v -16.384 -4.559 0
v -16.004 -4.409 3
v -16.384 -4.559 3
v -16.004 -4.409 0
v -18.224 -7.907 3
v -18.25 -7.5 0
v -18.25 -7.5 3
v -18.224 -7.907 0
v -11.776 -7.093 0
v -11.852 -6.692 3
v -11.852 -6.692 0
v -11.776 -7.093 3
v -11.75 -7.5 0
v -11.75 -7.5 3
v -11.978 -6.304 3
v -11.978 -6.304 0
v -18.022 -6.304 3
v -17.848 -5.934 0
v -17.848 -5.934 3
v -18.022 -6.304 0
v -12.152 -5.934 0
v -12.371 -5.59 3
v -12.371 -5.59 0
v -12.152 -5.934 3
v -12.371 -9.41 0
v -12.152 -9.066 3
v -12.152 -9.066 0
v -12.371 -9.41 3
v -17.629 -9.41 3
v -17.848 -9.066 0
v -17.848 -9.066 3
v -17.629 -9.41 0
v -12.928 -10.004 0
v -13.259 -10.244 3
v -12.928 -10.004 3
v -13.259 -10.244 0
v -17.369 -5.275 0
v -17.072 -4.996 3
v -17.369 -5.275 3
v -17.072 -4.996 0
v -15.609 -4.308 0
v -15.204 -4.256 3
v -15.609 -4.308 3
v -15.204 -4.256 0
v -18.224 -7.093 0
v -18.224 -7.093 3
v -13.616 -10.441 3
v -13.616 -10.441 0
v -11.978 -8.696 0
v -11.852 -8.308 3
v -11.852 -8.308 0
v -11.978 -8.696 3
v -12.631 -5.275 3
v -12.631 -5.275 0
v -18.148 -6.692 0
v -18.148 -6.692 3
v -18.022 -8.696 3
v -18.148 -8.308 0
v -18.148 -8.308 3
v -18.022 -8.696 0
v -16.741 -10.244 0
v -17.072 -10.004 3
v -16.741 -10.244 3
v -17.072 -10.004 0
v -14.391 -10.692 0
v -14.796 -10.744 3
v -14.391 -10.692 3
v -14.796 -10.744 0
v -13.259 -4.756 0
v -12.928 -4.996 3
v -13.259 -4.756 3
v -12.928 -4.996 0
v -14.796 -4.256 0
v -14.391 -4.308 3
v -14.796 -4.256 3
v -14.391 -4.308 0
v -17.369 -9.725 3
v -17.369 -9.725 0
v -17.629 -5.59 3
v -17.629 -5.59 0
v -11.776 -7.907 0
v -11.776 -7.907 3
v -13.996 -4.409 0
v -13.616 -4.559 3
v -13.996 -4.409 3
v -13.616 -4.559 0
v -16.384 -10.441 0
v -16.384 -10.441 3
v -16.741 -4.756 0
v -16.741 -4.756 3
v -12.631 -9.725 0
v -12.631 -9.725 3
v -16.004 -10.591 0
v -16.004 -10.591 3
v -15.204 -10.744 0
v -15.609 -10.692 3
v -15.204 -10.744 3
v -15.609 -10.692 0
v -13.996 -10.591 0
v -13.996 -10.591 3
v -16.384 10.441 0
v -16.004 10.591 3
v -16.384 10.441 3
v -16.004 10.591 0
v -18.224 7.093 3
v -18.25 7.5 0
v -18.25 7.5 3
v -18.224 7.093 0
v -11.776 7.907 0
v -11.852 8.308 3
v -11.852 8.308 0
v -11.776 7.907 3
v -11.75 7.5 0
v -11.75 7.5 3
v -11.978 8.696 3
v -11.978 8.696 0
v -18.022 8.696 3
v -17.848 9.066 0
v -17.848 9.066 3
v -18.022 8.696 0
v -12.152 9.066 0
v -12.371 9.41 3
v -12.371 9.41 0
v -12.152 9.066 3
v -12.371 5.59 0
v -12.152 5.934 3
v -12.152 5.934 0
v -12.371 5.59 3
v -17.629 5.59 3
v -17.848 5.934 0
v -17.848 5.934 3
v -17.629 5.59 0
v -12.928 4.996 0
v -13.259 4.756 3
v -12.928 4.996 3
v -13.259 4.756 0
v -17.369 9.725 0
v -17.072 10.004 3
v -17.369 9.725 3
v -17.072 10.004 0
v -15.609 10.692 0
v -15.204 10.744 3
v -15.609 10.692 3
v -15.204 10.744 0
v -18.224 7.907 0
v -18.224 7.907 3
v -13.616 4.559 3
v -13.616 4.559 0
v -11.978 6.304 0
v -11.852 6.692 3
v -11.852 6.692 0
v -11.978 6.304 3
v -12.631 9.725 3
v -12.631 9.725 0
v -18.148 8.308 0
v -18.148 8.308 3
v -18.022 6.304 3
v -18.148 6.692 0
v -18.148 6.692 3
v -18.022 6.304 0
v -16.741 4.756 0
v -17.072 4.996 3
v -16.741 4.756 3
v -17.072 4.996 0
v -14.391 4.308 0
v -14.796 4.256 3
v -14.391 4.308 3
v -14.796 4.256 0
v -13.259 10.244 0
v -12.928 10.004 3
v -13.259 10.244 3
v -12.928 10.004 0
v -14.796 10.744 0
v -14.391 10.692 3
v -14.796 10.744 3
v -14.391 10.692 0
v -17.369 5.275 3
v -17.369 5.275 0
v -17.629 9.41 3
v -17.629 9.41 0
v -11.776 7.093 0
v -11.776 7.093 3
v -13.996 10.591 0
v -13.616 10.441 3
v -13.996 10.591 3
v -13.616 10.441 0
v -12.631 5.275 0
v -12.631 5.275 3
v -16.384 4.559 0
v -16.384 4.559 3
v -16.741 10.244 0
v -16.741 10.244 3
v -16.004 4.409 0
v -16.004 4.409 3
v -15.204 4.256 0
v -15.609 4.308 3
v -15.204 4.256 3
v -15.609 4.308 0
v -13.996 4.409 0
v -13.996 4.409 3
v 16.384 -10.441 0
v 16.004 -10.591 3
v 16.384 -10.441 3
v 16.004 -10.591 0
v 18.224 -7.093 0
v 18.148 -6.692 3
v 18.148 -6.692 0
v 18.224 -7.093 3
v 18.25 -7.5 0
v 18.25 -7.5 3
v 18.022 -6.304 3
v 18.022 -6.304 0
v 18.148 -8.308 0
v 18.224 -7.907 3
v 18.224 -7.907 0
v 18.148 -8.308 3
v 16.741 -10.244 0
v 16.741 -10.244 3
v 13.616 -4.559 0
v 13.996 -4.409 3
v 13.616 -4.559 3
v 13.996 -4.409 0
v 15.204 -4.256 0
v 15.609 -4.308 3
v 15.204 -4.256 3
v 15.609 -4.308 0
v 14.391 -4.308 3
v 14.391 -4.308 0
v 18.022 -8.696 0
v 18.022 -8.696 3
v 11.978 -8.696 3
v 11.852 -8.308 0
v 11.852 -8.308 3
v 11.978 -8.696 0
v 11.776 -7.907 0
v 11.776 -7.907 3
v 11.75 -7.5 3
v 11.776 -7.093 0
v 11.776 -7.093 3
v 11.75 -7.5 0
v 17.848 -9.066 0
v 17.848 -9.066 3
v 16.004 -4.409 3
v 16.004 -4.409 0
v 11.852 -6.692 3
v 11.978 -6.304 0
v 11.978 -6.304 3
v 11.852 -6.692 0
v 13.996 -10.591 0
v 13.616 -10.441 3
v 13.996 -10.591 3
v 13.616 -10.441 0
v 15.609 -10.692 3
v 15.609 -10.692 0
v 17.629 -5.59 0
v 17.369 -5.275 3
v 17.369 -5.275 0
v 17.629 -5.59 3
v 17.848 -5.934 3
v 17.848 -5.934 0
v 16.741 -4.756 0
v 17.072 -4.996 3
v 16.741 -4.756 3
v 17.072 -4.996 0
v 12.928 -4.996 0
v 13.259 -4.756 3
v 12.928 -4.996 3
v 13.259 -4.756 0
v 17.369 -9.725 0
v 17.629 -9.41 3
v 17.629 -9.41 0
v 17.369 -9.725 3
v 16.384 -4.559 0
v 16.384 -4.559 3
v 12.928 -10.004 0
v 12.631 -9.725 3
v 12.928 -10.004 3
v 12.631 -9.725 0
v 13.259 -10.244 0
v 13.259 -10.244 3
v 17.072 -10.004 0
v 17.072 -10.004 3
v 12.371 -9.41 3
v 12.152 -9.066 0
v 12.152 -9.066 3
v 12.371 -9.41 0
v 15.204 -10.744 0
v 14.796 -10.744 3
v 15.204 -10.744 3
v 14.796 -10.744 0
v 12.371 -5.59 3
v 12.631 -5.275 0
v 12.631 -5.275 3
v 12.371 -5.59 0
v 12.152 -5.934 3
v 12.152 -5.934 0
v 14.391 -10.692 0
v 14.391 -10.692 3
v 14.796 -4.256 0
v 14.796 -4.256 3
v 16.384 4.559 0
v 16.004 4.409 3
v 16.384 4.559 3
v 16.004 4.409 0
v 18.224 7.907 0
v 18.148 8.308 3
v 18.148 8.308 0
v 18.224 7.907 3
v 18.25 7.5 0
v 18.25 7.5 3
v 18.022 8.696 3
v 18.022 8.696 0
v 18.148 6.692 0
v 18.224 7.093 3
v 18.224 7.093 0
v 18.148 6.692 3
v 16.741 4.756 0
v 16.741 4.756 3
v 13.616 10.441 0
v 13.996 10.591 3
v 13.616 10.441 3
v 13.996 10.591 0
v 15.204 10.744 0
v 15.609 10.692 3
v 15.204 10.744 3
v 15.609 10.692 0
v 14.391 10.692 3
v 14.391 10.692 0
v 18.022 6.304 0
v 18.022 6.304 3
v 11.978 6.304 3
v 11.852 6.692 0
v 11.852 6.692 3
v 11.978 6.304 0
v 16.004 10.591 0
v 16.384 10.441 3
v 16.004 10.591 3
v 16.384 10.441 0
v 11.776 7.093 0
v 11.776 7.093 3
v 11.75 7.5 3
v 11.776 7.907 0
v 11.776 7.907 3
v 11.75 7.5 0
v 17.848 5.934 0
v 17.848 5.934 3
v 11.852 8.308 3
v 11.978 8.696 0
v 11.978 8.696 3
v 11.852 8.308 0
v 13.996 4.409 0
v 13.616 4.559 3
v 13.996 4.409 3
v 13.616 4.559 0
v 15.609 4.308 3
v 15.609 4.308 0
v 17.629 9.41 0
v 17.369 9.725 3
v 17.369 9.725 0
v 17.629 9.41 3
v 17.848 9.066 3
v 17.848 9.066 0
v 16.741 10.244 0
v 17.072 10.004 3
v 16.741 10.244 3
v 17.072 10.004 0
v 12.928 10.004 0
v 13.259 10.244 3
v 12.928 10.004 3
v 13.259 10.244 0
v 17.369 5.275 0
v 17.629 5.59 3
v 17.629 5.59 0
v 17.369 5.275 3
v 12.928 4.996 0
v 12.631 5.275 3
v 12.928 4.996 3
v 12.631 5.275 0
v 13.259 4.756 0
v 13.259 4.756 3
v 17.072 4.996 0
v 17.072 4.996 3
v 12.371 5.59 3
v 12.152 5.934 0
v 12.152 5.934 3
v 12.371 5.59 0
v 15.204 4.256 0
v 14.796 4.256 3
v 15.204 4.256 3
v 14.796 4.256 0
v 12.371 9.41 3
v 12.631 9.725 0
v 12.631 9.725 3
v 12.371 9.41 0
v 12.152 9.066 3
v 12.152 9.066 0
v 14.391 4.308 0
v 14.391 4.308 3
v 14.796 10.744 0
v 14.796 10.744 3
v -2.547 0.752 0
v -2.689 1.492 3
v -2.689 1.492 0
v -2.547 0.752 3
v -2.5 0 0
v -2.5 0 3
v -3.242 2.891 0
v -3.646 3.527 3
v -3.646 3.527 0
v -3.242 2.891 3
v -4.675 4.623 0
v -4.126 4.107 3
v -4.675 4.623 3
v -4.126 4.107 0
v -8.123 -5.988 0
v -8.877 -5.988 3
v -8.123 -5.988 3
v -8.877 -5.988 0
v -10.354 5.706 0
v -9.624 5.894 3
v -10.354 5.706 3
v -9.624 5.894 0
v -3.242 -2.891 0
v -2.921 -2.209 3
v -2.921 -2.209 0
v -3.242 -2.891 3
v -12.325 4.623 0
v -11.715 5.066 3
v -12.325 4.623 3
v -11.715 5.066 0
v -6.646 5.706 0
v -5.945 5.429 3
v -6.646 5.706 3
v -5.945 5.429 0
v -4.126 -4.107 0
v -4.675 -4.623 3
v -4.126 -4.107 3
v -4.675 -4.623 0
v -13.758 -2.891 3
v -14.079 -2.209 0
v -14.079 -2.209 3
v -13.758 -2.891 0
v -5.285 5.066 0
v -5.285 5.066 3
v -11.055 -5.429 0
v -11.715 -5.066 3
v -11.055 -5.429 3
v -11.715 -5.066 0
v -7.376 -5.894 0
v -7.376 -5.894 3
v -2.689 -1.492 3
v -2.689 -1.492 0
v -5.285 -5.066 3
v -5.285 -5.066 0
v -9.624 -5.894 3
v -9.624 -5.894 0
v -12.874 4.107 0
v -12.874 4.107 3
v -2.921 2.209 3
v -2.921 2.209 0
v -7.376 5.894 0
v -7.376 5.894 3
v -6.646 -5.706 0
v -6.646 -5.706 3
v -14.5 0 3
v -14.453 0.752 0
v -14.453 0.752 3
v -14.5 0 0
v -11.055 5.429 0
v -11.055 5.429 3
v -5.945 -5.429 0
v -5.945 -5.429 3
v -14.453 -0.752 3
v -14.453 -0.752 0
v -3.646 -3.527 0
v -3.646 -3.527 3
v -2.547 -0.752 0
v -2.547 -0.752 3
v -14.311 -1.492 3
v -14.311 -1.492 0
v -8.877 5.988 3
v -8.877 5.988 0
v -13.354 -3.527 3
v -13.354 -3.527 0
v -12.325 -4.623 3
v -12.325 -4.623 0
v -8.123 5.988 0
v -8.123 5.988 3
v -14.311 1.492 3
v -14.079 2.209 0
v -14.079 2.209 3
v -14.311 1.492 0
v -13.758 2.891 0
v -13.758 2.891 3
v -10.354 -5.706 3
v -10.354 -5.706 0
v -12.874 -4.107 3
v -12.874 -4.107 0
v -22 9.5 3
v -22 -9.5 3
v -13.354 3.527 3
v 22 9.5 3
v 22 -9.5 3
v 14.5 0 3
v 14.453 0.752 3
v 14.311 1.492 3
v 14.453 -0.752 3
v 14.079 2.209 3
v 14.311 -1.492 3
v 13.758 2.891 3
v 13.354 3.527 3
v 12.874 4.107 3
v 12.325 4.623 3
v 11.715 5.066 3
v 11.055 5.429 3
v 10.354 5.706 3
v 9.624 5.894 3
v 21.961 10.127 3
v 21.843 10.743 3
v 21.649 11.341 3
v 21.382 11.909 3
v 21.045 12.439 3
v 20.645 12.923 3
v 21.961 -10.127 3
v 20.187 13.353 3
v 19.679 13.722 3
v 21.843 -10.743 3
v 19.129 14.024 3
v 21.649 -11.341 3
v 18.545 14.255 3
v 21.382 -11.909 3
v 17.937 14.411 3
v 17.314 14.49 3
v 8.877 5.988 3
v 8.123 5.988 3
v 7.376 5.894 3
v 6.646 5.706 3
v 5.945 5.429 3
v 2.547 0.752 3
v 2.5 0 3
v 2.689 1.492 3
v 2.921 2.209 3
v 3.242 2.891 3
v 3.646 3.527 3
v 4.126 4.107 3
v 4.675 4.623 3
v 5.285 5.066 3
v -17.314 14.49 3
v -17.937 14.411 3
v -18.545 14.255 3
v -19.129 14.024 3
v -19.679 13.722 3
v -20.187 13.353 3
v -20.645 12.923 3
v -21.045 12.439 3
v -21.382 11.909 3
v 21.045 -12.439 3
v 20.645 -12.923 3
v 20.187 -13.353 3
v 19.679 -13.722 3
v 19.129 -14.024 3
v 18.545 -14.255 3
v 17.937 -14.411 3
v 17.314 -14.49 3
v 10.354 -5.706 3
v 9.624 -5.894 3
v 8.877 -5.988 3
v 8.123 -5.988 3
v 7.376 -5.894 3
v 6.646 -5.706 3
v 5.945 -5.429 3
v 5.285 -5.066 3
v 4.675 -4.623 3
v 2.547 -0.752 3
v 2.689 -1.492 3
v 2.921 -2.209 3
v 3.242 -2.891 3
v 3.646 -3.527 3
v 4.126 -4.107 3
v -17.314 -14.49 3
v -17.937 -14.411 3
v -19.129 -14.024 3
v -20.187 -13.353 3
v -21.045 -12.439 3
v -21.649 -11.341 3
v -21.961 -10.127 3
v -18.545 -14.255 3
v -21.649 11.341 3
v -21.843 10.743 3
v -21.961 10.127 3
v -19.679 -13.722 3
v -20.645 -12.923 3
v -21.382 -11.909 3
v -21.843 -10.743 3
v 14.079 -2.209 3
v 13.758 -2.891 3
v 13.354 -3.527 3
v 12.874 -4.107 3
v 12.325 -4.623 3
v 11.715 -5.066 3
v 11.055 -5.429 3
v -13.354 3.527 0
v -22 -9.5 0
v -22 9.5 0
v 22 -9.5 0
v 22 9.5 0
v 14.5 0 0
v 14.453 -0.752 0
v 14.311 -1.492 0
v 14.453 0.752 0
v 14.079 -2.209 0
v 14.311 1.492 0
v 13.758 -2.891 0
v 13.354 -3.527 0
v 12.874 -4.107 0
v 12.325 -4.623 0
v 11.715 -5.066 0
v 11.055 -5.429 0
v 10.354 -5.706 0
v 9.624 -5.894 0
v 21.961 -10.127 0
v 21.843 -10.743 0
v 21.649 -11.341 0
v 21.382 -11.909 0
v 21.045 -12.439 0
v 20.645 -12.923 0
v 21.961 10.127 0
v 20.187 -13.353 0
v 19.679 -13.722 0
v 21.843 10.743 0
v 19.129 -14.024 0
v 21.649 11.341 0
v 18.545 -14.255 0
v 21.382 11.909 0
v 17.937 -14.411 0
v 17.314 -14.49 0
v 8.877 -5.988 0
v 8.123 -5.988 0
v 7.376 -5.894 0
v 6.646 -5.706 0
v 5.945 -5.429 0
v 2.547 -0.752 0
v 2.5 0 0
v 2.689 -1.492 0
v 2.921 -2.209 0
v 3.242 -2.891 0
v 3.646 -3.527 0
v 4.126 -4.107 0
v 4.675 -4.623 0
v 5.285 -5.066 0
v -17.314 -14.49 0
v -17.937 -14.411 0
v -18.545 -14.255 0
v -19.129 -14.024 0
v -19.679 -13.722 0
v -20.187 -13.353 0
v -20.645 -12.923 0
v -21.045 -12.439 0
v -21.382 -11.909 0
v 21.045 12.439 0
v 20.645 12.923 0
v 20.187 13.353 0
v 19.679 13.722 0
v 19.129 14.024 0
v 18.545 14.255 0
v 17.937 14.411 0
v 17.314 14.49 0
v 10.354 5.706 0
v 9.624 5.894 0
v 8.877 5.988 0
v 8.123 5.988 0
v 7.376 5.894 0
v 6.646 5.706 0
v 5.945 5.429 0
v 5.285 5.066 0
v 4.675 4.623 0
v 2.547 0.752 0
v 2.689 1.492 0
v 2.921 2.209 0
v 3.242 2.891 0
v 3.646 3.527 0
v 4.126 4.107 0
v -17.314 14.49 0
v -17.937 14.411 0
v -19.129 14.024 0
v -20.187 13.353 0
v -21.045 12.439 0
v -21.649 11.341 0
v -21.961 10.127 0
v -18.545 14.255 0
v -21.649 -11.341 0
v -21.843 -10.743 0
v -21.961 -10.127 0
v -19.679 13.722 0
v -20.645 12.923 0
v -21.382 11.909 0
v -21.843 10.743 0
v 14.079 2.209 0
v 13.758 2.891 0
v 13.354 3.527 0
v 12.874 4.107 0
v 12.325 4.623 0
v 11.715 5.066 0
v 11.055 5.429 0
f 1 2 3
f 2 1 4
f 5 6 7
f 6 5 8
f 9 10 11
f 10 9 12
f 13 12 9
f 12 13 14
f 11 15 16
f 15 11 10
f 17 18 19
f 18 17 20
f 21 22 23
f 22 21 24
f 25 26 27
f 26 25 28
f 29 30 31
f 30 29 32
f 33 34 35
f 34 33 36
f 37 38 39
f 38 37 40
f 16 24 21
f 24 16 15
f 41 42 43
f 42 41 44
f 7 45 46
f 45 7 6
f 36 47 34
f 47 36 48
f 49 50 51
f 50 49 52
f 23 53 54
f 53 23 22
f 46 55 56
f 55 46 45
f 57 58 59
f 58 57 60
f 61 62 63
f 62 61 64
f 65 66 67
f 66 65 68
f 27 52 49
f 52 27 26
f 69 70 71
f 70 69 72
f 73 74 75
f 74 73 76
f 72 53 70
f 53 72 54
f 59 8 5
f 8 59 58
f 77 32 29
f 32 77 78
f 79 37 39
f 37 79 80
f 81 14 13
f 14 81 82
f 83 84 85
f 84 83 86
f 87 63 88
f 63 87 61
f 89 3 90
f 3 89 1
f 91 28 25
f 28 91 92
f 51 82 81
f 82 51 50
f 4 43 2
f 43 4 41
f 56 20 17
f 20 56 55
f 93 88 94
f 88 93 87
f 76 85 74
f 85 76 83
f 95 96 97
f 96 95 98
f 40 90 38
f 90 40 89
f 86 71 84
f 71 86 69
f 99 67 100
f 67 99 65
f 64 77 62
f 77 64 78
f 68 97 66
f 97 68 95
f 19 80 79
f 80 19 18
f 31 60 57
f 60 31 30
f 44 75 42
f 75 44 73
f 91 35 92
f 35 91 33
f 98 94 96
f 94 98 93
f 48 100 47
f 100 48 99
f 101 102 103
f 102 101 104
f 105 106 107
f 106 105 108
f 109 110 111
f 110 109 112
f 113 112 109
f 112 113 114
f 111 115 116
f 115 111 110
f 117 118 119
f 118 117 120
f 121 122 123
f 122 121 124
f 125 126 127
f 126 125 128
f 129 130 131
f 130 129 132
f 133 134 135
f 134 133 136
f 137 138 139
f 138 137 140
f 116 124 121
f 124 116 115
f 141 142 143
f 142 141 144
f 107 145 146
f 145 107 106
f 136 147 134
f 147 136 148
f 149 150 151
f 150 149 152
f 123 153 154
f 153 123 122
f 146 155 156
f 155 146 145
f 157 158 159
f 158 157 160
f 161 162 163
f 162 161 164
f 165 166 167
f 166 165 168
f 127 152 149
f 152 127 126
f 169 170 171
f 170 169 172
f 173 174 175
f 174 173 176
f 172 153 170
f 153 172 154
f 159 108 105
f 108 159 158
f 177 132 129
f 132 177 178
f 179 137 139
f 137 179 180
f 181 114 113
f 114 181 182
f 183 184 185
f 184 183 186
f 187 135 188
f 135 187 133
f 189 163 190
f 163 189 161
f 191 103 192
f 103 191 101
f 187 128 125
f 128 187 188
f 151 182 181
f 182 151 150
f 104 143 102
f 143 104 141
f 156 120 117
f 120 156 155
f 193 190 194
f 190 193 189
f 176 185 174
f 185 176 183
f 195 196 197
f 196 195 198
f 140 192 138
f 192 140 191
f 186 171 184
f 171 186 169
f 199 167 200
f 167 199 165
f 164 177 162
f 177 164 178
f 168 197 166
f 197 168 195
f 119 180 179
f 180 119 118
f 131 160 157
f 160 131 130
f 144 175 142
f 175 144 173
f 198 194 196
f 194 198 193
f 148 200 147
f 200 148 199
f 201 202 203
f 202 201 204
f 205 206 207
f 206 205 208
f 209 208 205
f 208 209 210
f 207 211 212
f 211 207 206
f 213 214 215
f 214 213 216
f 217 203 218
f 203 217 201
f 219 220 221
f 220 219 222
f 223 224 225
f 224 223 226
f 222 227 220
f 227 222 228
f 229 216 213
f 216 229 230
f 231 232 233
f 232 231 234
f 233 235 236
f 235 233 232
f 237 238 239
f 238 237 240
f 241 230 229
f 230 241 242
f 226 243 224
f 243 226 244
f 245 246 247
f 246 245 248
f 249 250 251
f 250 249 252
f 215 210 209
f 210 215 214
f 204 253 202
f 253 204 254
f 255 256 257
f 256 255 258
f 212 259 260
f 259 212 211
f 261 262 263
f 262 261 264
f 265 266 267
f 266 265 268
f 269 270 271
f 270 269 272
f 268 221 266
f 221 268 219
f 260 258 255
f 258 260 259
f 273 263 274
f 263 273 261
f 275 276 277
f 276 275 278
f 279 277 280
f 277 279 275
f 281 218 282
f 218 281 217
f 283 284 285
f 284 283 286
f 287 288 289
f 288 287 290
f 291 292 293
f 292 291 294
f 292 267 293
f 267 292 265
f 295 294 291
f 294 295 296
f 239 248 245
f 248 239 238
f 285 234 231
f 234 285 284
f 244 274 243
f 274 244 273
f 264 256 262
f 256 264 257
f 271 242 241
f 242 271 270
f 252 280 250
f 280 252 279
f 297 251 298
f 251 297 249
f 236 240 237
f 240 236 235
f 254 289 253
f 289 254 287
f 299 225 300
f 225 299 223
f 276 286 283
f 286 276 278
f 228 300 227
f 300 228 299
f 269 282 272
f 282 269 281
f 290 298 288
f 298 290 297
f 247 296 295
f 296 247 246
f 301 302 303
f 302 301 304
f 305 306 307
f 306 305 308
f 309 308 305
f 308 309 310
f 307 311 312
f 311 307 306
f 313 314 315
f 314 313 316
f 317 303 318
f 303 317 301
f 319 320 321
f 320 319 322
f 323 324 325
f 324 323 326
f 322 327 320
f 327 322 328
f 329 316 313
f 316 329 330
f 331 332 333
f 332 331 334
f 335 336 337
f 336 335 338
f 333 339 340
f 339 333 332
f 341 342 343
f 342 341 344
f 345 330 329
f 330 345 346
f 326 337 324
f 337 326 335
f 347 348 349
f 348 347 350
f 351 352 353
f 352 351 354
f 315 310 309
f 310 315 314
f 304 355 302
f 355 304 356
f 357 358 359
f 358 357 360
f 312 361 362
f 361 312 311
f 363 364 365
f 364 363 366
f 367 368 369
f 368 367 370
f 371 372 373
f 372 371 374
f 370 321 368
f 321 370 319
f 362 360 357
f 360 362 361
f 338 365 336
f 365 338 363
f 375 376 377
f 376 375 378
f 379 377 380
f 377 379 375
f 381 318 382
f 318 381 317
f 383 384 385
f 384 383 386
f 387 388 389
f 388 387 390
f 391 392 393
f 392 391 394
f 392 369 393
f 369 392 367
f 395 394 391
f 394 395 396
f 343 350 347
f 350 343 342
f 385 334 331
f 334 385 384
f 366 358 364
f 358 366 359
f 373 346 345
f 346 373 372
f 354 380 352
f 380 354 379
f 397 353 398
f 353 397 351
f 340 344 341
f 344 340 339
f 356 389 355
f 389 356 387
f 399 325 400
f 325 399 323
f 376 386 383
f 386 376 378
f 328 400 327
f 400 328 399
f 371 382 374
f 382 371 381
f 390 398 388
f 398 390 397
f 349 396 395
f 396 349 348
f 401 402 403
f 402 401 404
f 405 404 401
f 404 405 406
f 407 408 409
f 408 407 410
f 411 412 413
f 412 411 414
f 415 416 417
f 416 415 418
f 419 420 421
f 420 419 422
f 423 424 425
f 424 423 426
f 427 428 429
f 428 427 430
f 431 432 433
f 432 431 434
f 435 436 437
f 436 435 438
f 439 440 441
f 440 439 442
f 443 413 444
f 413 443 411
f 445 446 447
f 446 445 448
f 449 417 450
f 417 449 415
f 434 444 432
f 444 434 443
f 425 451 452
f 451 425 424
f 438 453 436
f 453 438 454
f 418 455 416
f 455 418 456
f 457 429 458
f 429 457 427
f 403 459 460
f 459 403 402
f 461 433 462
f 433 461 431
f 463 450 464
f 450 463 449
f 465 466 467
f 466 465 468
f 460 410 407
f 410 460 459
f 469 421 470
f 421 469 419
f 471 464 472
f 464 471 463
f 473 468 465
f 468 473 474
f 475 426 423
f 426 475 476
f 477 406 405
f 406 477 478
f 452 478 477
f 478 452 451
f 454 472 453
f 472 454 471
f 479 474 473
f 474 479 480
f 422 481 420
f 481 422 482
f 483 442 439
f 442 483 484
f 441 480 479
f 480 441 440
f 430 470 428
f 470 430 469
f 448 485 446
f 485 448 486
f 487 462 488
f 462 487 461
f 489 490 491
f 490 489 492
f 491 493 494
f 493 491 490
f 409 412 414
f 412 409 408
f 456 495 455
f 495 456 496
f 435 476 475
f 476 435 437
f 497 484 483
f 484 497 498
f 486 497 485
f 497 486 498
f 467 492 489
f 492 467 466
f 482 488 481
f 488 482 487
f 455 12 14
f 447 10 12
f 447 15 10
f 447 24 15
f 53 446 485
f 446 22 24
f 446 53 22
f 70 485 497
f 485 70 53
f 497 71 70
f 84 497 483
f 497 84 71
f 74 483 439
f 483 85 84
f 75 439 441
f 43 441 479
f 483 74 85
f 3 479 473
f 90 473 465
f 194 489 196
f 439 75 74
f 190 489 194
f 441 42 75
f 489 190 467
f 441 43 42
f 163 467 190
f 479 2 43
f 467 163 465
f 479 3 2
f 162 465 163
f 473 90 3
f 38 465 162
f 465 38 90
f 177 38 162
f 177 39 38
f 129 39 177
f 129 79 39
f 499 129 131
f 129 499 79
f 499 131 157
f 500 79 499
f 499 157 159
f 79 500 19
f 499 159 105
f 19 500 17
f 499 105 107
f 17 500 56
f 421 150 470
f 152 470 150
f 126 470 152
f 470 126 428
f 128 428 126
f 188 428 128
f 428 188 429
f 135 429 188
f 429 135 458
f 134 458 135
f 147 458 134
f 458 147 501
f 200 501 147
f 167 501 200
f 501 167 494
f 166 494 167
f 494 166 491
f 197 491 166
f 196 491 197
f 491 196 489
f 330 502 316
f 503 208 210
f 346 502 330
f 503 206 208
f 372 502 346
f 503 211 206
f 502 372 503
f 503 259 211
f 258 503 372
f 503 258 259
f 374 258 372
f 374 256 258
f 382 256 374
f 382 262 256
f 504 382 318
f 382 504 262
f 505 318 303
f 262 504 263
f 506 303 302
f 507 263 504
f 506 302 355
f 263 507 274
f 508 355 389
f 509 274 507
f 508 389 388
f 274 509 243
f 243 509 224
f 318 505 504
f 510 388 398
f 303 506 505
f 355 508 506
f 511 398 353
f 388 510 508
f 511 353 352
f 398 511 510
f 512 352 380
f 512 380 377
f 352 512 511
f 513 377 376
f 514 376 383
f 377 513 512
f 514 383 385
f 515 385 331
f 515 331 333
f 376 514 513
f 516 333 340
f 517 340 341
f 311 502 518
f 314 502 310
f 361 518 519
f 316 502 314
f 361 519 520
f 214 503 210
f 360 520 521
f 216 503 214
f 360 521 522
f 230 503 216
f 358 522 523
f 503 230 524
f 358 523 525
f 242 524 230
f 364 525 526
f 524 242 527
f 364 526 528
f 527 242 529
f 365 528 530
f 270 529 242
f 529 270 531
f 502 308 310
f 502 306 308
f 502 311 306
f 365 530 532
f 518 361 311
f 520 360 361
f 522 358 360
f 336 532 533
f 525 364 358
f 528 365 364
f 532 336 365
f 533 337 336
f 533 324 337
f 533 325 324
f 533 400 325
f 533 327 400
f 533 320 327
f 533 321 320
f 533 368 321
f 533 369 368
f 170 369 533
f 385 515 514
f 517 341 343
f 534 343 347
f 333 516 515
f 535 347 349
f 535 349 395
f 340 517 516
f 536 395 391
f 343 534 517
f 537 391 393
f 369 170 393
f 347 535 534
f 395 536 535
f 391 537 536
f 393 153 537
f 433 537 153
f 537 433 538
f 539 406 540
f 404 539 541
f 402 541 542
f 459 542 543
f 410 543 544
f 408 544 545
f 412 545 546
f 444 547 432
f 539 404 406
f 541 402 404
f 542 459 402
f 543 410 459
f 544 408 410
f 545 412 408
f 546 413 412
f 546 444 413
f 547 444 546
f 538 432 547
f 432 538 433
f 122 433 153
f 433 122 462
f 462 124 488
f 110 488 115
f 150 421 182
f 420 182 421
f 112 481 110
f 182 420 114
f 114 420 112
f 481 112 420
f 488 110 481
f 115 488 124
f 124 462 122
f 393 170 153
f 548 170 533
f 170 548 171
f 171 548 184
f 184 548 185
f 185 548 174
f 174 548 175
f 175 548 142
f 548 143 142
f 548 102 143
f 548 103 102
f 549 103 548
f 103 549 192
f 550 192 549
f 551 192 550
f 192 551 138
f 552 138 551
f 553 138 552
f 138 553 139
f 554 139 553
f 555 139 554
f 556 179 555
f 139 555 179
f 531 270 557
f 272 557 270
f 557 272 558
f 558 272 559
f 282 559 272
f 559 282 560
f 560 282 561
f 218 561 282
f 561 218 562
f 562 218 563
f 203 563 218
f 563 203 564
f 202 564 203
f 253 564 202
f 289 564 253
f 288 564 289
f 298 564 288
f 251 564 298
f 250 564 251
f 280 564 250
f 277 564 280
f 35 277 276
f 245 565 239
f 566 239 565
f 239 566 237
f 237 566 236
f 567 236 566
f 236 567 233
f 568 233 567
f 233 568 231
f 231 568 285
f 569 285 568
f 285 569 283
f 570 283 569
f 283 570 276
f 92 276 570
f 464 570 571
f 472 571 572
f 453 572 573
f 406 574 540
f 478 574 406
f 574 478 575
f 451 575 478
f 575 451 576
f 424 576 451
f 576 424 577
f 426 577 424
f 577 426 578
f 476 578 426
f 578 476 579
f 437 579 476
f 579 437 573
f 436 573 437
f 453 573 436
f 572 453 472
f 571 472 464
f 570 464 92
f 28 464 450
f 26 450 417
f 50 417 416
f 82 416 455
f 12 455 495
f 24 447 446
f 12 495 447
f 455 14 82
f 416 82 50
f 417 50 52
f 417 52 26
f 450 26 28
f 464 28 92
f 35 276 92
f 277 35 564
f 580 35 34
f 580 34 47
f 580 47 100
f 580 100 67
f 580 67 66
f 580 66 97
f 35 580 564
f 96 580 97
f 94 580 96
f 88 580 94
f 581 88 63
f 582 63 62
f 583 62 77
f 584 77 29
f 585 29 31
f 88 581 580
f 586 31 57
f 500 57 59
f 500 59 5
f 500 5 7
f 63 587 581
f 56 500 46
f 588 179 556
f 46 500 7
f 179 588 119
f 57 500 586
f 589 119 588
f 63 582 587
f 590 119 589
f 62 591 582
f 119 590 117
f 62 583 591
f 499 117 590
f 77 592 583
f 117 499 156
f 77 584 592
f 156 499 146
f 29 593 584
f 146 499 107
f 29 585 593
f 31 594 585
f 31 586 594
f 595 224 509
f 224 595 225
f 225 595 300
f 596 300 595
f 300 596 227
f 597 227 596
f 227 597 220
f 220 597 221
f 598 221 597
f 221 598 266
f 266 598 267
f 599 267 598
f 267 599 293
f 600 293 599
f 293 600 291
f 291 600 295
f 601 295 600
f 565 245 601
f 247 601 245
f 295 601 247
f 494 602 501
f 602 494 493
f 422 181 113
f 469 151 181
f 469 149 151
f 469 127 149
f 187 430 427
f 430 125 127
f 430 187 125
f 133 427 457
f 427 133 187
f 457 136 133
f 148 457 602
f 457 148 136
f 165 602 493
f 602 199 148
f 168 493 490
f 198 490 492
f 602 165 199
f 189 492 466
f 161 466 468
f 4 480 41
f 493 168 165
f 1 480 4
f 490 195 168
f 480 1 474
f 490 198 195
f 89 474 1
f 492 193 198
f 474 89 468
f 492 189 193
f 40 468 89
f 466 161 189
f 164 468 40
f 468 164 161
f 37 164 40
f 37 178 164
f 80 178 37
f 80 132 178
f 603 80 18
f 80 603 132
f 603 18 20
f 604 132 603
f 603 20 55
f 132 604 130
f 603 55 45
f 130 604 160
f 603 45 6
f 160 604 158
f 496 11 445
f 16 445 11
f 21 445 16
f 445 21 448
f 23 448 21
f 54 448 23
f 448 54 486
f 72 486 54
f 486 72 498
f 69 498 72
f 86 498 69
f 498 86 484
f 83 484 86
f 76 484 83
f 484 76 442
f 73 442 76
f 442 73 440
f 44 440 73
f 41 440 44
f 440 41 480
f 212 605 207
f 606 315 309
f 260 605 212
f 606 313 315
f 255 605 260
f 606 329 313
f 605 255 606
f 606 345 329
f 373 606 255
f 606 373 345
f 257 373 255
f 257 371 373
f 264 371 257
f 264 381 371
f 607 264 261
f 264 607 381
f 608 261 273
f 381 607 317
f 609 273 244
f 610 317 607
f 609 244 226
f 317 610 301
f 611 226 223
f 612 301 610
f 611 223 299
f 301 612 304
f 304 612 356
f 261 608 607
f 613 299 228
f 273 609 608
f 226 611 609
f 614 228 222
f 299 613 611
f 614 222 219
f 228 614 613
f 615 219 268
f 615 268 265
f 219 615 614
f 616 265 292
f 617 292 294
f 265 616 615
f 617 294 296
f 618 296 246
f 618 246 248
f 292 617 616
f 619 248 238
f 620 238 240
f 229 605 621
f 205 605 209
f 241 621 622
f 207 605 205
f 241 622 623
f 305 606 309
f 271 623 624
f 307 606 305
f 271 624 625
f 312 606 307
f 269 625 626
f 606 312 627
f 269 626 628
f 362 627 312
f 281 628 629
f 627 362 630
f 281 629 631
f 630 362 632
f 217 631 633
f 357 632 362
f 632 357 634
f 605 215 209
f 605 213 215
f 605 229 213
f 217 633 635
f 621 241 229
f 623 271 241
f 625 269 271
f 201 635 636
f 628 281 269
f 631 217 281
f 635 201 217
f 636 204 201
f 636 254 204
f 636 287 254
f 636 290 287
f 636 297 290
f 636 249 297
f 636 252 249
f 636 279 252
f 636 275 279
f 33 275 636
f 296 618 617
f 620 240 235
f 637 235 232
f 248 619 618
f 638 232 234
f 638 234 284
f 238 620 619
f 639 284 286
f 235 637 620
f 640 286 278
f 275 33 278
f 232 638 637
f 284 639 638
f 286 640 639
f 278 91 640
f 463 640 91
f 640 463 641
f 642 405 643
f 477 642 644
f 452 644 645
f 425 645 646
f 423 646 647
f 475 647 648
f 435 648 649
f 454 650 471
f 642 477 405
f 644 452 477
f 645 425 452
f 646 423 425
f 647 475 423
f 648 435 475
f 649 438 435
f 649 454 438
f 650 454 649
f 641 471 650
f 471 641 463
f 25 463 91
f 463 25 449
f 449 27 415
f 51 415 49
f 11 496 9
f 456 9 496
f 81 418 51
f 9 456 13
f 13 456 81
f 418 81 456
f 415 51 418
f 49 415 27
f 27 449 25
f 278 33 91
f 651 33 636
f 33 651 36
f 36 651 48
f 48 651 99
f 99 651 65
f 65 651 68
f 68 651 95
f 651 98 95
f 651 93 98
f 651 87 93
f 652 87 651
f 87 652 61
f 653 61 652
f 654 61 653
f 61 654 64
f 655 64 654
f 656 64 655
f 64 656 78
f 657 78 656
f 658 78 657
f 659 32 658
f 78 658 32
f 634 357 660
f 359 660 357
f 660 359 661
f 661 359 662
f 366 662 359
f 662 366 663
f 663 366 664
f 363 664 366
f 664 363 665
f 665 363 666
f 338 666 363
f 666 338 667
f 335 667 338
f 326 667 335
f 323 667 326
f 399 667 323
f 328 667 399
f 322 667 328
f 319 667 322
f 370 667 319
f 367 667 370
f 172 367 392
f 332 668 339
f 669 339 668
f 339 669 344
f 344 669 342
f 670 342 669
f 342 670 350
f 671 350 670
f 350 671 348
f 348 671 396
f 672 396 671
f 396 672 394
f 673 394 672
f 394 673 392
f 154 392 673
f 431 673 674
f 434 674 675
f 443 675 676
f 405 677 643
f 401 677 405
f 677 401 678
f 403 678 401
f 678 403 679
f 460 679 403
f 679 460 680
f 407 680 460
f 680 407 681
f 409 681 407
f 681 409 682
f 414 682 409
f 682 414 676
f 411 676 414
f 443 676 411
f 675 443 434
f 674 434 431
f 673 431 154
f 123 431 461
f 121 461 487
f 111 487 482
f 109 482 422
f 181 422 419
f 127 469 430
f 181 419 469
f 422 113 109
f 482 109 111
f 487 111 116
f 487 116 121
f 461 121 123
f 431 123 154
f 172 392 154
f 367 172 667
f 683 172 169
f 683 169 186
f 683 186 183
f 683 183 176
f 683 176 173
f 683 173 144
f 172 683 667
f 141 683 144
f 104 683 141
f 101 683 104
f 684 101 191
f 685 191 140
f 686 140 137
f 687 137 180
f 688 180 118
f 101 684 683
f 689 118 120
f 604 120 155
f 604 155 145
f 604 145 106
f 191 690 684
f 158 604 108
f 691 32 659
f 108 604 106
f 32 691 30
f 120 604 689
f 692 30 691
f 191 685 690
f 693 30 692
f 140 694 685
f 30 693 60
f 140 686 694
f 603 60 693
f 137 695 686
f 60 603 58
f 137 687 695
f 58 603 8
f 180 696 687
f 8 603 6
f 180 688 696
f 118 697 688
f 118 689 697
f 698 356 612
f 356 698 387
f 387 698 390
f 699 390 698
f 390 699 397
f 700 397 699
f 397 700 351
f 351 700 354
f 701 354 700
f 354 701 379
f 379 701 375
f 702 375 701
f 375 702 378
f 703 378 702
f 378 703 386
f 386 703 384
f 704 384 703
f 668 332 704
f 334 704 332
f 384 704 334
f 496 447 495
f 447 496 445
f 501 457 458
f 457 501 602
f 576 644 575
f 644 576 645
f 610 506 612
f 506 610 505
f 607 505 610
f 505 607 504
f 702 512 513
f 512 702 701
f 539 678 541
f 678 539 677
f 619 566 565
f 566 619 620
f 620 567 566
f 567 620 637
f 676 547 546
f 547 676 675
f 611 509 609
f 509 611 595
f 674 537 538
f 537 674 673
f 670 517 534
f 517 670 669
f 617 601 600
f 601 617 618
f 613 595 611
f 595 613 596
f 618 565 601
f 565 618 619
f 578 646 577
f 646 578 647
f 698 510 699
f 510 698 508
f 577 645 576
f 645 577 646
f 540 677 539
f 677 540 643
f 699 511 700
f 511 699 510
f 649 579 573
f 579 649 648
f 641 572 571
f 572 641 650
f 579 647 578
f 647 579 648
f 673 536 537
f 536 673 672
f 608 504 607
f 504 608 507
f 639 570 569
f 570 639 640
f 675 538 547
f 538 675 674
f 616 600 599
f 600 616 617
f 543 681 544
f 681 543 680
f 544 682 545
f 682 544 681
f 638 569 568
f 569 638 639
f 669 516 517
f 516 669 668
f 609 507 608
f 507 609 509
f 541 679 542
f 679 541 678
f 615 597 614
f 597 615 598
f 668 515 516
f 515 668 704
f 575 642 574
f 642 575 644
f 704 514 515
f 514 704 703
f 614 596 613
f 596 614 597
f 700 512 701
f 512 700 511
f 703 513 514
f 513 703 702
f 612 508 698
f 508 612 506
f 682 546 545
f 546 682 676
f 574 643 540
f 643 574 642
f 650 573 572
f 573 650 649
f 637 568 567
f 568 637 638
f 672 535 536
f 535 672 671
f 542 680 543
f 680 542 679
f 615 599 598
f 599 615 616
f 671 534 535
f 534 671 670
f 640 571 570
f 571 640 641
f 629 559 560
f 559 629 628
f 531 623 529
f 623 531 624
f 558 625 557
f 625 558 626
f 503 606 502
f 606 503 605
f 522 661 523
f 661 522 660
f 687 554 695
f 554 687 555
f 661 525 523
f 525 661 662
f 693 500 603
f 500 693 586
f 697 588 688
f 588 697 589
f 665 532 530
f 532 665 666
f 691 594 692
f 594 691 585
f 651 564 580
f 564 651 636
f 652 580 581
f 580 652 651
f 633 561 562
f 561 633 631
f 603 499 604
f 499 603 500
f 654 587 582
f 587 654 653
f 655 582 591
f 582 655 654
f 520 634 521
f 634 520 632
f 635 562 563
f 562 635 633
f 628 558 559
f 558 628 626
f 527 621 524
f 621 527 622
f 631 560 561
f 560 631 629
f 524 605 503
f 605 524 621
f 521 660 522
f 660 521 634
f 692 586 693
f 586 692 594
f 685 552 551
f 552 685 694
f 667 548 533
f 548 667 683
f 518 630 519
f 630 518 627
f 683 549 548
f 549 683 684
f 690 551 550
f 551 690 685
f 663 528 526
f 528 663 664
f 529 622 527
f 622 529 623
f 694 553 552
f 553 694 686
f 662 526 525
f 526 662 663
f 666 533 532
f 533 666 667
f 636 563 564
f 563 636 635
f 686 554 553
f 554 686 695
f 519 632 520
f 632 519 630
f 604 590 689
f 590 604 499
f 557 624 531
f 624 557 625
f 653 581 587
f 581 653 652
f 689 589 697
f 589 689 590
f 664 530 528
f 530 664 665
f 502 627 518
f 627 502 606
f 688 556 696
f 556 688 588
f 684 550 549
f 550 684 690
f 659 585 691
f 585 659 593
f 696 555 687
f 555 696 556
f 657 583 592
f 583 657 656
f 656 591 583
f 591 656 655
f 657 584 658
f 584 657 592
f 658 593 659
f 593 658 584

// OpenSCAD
$fn = 50;


difference() {
	union() {
		hull() {
			translate(v = [-17.0000000000, 9.5000000000, 0]) {
				cylinder(h = 3, r = 5);
			}
			translate(v = [17.0000000000, 9.5000000000, 0]) {
				cylinder(h = 3, r = 5);
			}
			translate(v = [-17.0000000000, -9.5000000000, 0]) {
				cylinder(h = 3, r = 5);
			}
			translate(v = [17.0000000000, -9.5000000000, 0]) {
				cylinder(h = 3, r = 5);
			}
		}
	}
	union() {
		#translate(v = [-15.0000000000, -7.5000000000, -100.0000000000]) {
			cylinder(h = 200, r = 3.2500000000);
		}
		#translate(v = [-15.0000000000, 7.5000000000, -100.0000000000]) {
			cylinder(h = 200, r = 3.2500000000);
		}
		#translate(v = [15.0000000000, -7.5000000000, -100.0000000000]) {
			cylinder(h = 200, r = 3.2500000000);
		}
		#translate(v = [15.0000000000, 7.5000000000, -100.0000000000]) {
			cylinder(h = 200, r = 3.2500000000);
		}
		#translate(v = [-8.5000000000, 0, 0]) {
			cylinder(h = 3, r = 6.0000000000);
		}
		#translate(v = [8.5000000000, 0, 0]) {
			cylinder(h = 3, r = 6.0000000000);
		}
	}
}
